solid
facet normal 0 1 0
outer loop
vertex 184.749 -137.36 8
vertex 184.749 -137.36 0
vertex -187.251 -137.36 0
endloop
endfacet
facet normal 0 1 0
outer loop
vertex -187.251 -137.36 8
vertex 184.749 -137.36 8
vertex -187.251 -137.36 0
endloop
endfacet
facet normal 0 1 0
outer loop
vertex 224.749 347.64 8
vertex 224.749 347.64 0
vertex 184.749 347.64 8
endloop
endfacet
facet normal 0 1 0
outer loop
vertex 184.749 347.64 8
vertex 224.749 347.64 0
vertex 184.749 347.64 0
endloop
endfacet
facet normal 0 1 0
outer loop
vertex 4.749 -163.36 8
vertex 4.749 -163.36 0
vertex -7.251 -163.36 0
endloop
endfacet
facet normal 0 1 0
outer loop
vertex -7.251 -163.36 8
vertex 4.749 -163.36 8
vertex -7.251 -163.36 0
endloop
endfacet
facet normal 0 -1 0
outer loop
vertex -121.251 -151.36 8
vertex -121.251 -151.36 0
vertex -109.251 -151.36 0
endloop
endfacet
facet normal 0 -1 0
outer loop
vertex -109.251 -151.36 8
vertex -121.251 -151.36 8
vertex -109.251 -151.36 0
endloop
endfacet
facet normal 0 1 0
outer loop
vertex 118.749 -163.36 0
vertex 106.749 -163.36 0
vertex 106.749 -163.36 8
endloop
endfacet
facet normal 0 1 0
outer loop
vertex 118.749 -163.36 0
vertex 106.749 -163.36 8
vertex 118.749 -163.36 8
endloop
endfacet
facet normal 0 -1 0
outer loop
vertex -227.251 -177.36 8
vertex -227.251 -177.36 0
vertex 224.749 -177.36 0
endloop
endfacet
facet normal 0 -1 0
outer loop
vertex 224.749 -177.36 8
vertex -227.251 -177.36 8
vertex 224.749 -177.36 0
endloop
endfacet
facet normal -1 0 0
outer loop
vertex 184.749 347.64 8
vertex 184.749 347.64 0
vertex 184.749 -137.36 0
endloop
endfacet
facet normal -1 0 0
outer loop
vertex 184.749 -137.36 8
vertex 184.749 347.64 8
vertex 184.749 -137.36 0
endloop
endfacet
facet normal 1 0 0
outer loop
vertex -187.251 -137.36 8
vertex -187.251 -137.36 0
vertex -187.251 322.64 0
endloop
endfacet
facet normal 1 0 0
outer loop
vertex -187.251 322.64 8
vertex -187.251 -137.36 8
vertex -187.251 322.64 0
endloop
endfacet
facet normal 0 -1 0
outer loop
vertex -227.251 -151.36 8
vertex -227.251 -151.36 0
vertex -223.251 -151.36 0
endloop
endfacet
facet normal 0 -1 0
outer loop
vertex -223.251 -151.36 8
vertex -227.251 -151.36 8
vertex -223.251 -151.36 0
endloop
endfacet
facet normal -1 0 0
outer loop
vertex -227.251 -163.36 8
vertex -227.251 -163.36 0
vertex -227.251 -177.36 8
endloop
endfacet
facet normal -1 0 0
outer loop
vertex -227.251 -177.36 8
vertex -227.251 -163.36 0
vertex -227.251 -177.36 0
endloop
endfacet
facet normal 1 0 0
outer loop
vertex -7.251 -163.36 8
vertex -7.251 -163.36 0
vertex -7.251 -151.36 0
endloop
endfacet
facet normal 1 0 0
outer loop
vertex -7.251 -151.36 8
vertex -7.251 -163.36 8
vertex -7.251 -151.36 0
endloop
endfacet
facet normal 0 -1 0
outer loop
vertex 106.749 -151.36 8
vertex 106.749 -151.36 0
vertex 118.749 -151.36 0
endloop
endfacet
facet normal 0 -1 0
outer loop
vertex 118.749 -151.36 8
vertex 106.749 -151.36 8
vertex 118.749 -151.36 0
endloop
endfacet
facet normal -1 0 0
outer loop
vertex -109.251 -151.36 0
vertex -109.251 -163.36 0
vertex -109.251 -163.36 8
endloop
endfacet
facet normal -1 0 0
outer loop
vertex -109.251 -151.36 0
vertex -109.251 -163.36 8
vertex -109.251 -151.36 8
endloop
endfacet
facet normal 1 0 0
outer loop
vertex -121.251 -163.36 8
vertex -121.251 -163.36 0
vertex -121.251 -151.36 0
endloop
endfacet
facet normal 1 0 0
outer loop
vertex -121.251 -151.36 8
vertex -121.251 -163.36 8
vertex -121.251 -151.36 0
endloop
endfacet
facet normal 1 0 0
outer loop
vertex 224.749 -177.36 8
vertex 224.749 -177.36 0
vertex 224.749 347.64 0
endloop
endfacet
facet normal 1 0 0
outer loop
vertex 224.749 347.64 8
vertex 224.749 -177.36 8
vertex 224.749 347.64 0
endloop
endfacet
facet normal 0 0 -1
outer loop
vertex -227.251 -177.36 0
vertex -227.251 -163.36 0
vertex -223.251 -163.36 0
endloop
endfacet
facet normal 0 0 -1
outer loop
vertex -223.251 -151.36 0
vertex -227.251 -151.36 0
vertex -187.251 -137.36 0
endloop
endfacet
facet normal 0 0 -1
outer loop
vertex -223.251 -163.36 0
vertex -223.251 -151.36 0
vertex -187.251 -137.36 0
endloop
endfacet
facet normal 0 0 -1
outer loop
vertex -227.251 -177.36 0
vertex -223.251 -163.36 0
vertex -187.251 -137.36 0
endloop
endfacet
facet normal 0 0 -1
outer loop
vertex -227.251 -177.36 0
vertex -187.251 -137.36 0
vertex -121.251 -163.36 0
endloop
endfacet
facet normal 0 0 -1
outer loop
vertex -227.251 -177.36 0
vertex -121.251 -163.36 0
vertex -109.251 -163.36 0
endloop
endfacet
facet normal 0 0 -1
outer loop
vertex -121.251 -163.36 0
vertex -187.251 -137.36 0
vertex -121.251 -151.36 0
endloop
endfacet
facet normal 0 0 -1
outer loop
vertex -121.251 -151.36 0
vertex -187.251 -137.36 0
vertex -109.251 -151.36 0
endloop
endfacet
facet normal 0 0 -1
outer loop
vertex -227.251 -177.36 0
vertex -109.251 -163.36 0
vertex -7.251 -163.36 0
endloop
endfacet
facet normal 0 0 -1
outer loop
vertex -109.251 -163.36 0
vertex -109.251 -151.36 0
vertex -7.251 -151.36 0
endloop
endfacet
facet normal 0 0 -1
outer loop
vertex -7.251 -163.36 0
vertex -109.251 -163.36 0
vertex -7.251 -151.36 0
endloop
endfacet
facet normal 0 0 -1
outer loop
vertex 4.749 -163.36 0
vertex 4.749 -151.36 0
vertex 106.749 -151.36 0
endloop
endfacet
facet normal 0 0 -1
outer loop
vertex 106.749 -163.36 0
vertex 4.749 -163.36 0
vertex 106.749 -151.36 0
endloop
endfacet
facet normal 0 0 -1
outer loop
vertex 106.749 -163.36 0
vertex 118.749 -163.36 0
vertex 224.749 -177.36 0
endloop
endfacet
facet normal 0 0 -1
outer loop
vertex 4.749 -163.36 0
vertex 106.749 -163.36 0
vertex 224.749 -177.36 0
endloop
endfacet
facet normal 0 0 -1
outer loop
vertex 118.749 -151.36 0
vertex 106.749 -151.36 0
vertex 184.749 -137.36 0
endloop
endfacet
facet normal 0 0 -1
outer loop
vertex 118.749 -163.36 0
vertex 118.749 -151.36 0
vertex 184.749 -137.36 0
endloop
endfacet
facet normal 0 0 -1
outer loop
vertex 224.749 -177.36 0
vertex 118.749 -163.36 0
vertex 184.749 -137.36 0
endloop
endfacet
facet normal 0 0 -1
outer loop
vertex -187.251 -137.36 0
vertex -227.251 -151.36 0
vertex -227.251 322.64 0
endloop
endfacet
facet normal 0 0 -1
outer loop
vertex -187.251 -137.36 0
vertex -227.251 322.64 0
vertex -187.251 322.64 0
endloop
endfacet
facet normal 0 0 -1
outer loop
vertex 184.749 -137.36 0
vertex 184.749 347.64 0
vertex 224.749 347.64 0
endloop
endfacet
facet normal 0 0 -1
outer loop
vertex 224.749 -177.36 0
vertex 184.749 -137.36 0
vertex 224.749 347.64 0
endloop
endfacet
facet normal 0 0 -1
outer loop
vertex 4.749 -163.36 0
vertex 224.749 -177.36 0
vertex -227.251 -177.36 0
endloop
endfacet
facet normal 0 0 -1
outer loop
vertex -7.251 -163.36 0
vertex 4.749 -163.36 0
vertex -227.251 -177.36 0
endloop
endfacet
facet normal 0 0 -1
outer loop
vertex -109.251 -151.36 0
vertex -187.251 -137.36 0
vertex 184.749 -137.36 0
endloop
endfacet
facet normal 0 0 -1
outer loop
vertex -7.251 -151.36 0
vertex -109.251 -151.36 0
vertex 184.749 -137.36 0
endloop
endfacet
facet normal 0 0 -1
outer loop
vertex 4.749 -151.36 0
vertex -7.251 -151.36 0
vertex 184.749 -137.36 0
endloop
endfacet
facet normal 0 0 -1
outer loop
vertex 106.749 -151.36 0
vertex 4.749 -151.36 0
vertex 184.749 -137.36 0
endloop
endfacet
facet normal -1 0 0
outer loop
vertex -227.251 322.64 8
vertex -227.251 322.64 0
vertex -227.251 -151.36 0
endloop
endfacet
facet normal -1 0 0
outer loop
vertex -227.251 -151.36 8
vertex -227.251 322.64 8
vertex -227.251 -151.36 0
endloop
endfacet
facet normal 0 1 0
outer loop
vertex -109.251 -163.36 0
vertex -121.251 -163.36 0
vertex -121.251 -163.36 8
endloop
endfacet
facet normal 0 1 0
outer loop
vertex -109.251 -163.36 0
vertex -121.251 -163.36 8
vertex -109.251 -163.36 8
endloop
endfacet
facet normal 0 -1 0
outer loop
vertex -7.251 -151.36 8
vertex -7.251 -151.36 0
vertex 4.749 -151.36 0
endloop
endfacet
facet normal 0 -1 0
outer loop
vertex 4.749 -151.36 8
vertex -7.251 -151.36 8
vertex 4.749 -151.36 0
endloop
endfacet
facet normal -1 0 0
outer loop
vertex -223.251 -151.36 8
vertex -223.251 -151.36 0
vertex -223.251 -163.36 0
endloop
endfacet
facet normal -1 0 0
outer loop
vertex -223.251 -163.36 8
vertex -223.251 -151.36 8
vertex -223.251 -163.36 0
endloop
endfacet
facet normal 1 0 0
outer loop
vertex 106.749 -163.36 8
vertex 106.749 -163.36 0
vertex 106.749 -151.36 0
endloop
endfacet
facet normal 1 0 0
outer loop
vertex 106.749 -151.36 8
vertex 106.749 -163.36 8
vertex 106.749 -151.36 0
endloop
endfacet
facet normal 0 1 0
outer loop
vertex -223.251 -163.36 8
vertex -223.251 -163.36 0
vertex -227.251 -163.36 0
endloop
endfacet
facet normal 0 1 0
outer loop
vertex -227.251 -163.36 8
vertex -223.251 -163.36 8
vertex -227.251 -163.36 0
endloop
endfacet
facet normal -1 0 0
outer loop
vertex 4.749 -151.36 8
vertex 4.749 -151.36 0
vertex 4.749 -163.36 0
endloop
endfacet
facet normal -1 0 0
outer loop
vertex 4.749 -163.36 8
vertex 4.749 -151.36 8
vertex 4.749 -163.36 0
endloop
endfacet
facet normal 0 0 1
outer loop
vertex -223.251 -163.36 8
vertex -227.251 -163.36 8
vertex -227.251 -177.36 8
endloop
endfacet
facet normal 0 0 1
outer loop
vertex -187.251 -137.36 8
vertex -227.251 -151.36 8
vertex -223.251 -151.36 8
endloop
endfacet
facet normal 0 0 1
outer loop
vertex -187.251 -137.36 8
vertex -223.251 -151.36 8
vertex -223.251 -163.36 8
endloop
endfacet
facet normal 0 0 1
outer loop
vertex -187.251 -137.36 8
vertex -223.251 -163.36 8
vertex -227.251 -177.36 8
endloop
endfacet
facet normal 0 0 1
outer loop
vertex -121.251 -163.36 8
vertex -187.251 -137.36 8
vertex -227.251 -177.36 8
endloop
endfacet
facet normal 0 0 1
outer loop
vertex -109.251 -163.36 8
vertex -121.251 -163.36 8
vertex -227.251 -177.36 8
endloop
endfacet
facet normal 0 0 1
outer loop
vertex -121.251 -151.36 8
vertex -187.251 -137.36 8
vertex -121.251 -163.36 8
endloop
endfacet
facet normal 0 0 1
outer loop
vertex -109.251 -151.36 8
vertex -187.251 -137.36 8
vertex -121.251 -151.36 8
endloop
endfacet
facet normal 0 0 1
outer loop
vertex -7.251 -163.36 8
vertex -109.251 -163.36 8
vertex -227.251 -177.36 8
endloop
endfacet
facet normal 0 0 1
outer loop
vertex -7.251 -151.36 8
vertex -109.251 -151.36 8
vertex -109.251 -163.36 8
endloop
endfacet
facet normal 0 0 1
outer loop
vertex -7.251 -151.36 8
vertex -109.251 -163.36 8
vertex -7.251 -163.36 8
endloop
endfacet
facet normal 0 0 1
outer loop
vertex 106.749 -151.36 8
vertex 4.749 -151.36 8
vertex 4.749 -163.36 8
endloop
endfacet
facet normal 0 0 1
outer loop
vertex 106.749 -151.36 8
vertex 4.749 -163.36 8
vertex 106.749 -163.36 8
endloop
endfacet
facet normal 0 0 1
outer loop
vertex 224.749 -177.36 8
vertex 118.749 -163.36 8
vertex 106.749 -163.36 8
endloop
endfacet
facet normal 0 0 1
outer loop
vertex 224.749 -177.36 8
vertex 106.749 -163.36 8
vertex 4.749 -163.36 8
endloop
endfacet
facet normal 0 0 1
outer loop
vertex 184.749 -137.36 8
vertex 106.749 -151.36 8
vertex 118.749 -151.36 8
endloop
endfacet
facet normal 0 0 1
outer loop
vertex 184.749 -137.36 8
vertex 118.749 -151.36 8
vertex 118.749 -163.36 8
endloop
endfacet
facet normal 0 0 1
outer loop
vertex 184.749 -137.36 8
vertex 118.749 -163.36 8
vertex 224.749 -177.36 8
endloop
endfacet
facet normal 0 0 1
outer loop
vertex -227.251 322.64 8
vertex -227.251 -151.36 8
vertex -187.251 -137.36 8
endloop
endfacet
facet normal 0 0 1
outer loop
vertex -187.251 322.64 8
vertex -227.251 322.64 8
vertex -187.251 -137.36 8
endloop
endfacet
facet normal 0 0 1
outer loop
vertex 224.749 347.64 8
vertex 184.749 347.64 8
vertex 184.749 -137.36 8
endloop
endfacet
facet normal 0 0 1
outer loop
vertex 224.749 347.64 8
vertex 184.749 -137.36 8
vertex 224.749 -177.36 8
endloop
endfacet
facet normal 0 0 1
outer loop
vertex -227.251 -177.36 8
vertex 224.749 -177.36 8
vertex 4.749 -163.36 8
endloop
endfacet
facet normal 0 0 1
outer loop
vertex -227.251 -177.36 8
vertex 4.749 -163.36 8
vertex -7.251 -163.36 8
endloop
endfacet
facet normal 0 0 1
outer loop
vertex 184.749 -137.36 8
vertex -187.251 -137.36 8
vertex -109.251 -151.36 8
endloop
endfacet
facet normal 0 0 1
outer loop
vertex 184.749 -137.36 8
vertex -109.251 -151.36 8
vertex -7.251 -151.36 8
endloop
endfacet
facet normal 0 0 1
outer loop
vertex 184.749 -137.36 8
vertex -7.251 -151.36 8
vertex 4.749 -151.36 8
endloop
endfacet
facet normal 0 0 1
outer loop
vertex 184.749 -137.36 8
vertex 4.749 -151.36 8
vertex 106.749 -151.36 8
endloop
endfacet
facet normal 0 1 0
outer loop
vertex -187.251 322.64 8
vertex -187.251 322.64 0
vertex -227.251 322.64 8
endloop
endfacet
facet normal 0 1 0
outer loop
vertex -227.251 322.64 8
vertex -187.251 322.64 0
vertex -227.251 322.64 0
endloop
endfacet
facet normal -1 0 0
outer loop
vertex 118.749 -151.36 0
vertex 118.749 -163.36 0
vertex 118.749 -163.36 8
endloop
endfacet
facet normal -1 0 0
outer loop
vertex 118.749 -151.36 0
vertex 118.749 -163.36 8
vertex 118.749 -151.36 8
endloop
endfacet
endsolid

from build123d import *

# Parameters (mm, degrees)
F0_W     = 12
F0_H     = 12
F1_DEPTH = 8


with BuildPart() as f1:
    # F0 (on Top) → F1 (new body)
    with BuildSketch(Plane.XY):
        Polygon((-187.250624, 322.639689), (-227.250624, 322.639689), (-227.250624, -151.360311), (-223.250624, -151.360311), (-223.250624, -163.360311), (-227.250624, -163.360311), (-227.250624, -177.360311), (224.749376, -177.360311), (224.749376, 347.639689), (184.749376, 347.639689), (184.749376, -137.360311), (-1.250624, -137.360311), (-187.250624, -137.360311), align=None)
        with Locations((-115.250624, -157.360311)):
            Rectangle(F0_W, F0_H, mode=Mode.SUBTRACT)
        Polygon((-7.250624, -151.360311), (-1.250624, -151.360311), (4.749376, -151.360311), (4.749376, -163.360311), (-7.250624, -163.360311), align=None, mode=Mode.SUBTRACT)
        with Locations((112.749376, -157.360311)):
            Rectangle(F0_W, F0_H, mode=Mode.SUBTRACT)
    extrude(amount=F1_DEPTH)


solid = f1.part
